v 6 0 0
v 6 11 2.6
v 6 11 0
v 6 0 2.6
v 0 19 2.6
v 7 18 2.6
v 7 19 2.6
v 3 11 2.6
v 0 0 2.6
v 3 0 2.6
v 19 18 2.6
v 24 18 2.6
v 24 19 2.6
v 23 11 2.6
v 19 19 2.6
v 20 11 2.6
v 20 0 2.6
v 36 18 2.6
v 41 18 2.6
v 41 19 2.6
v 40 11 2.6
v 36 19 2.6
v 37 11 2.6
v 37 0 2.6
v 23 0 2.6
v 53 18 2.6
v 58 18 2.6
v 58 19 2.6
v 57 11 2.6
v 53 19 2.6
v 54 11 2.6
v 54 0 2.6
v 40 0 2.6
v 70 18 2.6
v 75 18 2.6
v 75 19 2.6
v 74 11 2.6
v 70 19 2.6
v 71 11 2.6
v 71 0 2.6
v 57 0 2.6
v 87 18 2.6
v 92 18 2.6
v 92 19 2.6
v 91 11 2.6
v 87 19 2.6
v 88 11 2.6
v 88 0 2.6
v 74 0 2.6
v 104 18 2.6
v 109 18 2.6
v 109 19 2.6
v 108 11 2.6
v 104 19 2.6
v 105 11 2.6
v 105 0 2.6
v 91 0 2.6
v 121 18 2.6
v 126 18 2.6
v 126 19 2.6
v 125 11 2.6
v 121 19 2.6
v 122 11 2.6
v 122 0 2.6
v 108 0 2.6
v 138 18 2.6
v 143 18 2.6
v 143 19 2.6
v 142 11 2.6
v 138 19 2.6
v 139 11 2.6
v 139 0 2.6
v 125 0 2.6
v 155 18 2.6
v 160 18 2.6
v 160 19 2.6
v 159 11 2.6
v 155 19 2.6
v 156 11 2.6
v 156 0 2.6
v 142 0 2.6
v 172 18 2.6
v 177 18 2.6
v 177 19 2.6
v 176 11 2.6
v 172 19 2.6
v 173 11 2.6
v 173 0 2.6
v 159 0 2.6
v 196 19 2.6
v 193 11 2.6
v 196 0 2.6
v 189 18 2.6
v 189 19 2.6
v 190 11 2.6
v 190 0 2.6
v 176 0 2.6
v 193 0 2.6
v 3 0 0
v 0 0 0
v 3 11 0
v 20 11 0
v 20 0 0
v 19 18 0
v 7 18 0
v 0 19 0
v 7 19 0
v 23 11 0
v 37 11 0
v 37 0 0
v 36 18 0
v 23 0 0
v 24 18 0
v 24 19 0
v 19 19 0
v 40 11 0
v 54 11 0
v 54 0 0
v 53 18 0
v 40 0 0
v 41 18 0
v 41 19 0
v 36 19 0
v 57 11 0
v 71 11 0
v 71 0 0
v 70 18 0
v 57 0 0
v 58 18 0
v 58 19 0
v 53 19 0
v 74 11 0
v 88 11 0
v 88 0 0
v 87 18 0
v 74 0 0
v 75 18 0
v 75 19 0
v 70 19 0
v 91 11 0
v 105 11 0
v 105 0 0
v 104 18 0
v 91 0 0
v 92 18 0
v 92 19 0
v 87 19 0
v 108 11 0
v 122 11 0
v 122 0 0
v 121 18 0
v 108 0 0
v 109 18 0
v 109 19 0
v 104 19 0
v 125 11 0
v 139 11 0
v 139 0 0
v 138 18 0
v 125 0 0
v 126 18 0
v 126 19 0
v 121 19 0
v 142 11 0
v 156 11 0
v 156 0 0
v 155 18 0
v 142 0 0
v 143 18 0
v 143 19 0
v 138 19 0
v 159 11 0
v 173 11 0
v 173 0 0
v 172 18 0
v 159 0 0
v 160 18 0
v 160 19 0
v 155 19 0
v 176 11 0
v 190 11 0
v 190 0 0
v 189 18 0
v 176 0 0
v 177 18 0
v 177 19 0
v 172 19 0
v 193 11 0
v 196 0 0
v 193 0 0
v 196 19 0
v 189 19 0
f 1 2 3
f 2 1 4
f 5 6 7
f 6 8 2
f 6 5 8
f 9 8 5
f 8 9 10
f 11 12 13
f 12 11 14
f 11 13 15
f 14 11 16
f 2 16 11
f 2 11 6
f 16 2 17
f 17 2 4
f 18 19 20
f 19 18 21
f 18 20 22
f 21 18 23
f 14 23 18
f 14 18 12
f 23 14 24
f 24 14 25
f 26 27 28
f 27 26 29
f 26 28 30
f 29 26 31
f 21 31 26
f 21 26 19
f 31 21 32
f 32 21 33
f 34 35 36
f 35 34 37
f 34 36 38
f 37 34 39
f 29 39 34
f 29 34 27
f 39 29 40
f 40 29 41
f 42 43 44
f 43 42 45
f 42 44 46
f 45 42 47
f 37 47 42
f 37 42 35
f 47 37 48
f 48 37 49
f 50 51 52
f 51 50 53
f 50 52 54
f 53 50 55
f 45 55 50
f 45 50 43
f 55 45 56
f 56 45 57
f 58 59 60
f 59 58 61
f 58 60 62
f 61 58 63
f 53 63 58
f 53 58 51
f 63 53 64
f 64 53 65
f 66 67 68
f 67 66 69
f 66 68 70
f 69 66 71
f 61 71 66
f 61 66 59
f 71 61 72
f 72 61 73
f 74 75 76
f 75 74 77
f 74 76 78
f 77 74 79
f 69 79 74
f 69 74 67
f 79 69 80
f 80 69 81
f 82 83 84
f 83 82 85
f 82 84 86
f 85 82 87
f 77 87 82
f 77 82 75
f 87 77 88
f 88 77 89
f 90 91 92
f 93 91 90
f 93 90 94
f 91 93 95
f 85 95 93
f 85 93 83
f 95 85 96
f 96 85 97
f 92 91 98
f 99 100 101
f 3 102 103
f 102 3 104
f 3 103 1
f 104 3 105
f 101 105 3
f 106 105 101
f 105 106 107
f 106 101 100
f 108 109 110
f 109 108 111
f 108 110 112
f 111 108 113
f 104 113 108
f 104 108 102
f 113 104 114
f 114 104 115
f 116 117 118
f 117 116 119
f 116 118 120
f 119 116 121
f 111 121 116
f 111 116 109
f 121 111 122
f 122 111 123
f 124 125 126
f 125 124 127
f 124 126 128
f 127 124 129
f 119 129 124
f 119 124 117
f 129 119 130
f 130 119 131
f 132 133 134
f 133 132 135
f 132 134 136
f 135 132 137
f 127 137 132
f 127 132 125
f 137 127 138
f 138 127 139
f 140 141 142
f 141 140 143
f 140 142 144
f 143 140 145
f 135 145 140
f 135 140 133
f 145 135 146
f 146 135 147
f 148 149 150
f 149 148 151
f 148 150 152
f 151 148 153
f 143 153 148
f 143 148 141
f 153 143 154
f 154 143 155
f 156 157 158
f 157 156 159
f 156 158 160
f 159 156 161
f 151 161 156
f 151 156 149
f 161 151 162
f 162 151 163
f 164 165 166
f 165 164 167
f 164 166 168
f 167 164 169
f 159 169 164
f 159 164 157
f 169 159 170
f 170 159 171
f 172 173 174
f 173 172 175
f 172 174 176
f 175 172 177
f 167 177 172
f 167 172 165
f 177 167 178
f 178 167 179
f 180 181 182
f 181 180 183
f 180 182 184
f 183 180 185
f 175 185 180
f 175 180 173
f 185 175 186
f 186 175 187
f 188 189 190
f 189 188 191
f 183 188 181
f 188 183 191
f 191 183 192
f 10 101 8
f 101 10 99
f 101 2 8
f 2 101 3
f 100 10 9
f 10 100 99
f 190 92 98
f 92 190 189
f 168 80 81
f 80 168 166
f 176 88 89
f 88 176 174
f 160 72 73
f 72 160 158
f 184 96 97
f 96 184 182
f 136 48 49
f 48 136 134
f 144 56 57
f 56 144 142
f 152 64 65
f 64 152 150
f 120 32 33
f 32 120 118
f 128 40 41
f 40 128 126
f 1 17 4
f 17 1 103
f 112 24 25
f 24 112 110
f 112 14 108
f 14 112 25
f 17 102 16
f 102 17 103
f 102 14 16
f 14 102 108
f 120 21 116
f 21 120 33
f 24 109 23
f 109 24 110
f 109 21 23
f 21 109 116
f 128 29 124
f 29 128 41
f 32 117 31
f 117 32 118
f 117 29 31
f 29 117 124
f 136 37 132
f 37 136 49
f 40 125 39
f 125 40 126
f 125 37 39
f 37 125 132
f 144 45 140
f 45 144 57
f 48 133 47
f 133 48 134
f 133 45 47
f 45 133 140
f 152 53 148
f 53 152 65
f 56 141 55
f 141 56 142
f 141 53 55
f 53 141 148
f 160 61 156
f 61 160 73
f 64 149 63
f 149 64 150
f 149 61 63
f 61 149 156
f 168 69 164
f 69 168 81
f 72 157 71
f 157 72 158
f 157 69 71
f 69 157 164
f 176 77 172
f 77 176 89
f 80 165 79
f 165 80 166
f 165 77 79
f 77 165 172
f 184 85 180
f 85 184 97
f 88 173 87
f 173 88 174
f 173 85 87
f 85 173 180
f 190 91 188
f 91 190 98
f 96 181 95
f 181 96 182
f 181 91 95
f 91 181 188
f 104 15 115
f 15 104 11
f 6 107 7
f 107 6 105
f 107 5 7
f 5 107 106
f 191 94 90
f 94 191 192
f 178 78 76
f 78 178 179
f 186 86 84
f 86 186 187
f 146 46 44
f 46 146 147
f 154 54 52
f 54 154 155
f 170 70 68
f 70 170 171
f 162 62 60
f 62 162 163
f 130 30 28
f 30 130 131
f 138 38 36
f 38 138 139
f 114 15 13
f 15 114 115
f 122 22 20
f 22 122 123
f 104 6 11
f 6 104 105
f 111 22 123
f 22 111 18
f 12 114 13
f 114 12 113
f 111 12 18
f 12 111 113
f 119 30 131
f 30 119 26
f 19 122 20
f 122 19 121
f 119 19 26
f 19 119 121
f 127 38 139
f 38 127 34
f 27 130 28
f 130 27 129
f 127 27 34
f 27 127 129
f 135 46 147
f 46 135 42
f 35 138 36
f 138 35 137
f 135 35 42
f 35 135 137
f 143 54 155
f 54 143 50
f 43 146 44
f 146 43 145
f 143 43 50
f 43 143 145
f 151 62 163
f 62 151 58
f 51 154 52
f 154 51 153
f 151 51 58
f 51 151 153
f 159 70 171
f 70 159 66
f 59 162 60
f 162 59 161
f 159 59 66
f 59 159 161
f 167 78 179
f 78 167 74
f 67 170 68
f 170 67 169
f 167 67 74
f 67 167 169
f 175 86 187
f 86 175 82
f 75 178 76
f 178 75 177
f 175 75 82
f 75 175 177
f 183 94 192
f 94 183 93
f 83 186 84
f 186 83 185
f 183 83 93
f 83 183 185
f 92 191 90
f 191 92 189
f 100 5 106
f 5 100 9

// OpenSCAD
x_small=196;
x_large=228;
y=19;
z=2.6;

spacer=3;
spacer_cut_height=11;
spacer_cut_amount=12;
spare=14;
start_small=3;
end_small=3;
start_large=19;
end_large=19;
cable_cut_diam=4;
cable_cut=1;

//elementLarge(true);
elementSmall(true);

module elementLarge(cut) {
    difference() {
        cube([x_large,y,z]);
        translate([start_large/2 - cable_cut_diam/2, 0, 0]) cylinder(d=cable_cut_diam, h=z, center=false);
        translate([start_large/2 - cable_cut_diam/2, y, 0]) cylinder(d=cable_cut_diam, h=z, center=false);
        for (i=[0:spacer_cut_amount-1])
            translate([start_large + i*spacer + i*spare,0,0])
                cube([spacer,spacer_cut_height,z]);
        if(cut) {
        for (i=[0:spacer_cut_amount-2])
            translate([start_large + spacer + i*spacer + i*spare+1,y-cable_cut,0])
                cube([spare-2,cable_cut,z]);
        }
    };
} 

module elementSmall(cut) {
    difference() {
        cube([x_small,y,z]);
        for (i=[0:spacer_cut_amount-1])
            translate([start_small + i*spacer + i*spare,0,0])
                cube([spacer,spacer_cut_height,z]);
        if(cut) {
            for (i=[0:spacer_cut_amount-2])
                translate([start_small + spacer + i*spacer + i*spare+1,y-cable_cut,0])
                    cube([spare-2,cable_cut,z]);
        }
    };
} 
